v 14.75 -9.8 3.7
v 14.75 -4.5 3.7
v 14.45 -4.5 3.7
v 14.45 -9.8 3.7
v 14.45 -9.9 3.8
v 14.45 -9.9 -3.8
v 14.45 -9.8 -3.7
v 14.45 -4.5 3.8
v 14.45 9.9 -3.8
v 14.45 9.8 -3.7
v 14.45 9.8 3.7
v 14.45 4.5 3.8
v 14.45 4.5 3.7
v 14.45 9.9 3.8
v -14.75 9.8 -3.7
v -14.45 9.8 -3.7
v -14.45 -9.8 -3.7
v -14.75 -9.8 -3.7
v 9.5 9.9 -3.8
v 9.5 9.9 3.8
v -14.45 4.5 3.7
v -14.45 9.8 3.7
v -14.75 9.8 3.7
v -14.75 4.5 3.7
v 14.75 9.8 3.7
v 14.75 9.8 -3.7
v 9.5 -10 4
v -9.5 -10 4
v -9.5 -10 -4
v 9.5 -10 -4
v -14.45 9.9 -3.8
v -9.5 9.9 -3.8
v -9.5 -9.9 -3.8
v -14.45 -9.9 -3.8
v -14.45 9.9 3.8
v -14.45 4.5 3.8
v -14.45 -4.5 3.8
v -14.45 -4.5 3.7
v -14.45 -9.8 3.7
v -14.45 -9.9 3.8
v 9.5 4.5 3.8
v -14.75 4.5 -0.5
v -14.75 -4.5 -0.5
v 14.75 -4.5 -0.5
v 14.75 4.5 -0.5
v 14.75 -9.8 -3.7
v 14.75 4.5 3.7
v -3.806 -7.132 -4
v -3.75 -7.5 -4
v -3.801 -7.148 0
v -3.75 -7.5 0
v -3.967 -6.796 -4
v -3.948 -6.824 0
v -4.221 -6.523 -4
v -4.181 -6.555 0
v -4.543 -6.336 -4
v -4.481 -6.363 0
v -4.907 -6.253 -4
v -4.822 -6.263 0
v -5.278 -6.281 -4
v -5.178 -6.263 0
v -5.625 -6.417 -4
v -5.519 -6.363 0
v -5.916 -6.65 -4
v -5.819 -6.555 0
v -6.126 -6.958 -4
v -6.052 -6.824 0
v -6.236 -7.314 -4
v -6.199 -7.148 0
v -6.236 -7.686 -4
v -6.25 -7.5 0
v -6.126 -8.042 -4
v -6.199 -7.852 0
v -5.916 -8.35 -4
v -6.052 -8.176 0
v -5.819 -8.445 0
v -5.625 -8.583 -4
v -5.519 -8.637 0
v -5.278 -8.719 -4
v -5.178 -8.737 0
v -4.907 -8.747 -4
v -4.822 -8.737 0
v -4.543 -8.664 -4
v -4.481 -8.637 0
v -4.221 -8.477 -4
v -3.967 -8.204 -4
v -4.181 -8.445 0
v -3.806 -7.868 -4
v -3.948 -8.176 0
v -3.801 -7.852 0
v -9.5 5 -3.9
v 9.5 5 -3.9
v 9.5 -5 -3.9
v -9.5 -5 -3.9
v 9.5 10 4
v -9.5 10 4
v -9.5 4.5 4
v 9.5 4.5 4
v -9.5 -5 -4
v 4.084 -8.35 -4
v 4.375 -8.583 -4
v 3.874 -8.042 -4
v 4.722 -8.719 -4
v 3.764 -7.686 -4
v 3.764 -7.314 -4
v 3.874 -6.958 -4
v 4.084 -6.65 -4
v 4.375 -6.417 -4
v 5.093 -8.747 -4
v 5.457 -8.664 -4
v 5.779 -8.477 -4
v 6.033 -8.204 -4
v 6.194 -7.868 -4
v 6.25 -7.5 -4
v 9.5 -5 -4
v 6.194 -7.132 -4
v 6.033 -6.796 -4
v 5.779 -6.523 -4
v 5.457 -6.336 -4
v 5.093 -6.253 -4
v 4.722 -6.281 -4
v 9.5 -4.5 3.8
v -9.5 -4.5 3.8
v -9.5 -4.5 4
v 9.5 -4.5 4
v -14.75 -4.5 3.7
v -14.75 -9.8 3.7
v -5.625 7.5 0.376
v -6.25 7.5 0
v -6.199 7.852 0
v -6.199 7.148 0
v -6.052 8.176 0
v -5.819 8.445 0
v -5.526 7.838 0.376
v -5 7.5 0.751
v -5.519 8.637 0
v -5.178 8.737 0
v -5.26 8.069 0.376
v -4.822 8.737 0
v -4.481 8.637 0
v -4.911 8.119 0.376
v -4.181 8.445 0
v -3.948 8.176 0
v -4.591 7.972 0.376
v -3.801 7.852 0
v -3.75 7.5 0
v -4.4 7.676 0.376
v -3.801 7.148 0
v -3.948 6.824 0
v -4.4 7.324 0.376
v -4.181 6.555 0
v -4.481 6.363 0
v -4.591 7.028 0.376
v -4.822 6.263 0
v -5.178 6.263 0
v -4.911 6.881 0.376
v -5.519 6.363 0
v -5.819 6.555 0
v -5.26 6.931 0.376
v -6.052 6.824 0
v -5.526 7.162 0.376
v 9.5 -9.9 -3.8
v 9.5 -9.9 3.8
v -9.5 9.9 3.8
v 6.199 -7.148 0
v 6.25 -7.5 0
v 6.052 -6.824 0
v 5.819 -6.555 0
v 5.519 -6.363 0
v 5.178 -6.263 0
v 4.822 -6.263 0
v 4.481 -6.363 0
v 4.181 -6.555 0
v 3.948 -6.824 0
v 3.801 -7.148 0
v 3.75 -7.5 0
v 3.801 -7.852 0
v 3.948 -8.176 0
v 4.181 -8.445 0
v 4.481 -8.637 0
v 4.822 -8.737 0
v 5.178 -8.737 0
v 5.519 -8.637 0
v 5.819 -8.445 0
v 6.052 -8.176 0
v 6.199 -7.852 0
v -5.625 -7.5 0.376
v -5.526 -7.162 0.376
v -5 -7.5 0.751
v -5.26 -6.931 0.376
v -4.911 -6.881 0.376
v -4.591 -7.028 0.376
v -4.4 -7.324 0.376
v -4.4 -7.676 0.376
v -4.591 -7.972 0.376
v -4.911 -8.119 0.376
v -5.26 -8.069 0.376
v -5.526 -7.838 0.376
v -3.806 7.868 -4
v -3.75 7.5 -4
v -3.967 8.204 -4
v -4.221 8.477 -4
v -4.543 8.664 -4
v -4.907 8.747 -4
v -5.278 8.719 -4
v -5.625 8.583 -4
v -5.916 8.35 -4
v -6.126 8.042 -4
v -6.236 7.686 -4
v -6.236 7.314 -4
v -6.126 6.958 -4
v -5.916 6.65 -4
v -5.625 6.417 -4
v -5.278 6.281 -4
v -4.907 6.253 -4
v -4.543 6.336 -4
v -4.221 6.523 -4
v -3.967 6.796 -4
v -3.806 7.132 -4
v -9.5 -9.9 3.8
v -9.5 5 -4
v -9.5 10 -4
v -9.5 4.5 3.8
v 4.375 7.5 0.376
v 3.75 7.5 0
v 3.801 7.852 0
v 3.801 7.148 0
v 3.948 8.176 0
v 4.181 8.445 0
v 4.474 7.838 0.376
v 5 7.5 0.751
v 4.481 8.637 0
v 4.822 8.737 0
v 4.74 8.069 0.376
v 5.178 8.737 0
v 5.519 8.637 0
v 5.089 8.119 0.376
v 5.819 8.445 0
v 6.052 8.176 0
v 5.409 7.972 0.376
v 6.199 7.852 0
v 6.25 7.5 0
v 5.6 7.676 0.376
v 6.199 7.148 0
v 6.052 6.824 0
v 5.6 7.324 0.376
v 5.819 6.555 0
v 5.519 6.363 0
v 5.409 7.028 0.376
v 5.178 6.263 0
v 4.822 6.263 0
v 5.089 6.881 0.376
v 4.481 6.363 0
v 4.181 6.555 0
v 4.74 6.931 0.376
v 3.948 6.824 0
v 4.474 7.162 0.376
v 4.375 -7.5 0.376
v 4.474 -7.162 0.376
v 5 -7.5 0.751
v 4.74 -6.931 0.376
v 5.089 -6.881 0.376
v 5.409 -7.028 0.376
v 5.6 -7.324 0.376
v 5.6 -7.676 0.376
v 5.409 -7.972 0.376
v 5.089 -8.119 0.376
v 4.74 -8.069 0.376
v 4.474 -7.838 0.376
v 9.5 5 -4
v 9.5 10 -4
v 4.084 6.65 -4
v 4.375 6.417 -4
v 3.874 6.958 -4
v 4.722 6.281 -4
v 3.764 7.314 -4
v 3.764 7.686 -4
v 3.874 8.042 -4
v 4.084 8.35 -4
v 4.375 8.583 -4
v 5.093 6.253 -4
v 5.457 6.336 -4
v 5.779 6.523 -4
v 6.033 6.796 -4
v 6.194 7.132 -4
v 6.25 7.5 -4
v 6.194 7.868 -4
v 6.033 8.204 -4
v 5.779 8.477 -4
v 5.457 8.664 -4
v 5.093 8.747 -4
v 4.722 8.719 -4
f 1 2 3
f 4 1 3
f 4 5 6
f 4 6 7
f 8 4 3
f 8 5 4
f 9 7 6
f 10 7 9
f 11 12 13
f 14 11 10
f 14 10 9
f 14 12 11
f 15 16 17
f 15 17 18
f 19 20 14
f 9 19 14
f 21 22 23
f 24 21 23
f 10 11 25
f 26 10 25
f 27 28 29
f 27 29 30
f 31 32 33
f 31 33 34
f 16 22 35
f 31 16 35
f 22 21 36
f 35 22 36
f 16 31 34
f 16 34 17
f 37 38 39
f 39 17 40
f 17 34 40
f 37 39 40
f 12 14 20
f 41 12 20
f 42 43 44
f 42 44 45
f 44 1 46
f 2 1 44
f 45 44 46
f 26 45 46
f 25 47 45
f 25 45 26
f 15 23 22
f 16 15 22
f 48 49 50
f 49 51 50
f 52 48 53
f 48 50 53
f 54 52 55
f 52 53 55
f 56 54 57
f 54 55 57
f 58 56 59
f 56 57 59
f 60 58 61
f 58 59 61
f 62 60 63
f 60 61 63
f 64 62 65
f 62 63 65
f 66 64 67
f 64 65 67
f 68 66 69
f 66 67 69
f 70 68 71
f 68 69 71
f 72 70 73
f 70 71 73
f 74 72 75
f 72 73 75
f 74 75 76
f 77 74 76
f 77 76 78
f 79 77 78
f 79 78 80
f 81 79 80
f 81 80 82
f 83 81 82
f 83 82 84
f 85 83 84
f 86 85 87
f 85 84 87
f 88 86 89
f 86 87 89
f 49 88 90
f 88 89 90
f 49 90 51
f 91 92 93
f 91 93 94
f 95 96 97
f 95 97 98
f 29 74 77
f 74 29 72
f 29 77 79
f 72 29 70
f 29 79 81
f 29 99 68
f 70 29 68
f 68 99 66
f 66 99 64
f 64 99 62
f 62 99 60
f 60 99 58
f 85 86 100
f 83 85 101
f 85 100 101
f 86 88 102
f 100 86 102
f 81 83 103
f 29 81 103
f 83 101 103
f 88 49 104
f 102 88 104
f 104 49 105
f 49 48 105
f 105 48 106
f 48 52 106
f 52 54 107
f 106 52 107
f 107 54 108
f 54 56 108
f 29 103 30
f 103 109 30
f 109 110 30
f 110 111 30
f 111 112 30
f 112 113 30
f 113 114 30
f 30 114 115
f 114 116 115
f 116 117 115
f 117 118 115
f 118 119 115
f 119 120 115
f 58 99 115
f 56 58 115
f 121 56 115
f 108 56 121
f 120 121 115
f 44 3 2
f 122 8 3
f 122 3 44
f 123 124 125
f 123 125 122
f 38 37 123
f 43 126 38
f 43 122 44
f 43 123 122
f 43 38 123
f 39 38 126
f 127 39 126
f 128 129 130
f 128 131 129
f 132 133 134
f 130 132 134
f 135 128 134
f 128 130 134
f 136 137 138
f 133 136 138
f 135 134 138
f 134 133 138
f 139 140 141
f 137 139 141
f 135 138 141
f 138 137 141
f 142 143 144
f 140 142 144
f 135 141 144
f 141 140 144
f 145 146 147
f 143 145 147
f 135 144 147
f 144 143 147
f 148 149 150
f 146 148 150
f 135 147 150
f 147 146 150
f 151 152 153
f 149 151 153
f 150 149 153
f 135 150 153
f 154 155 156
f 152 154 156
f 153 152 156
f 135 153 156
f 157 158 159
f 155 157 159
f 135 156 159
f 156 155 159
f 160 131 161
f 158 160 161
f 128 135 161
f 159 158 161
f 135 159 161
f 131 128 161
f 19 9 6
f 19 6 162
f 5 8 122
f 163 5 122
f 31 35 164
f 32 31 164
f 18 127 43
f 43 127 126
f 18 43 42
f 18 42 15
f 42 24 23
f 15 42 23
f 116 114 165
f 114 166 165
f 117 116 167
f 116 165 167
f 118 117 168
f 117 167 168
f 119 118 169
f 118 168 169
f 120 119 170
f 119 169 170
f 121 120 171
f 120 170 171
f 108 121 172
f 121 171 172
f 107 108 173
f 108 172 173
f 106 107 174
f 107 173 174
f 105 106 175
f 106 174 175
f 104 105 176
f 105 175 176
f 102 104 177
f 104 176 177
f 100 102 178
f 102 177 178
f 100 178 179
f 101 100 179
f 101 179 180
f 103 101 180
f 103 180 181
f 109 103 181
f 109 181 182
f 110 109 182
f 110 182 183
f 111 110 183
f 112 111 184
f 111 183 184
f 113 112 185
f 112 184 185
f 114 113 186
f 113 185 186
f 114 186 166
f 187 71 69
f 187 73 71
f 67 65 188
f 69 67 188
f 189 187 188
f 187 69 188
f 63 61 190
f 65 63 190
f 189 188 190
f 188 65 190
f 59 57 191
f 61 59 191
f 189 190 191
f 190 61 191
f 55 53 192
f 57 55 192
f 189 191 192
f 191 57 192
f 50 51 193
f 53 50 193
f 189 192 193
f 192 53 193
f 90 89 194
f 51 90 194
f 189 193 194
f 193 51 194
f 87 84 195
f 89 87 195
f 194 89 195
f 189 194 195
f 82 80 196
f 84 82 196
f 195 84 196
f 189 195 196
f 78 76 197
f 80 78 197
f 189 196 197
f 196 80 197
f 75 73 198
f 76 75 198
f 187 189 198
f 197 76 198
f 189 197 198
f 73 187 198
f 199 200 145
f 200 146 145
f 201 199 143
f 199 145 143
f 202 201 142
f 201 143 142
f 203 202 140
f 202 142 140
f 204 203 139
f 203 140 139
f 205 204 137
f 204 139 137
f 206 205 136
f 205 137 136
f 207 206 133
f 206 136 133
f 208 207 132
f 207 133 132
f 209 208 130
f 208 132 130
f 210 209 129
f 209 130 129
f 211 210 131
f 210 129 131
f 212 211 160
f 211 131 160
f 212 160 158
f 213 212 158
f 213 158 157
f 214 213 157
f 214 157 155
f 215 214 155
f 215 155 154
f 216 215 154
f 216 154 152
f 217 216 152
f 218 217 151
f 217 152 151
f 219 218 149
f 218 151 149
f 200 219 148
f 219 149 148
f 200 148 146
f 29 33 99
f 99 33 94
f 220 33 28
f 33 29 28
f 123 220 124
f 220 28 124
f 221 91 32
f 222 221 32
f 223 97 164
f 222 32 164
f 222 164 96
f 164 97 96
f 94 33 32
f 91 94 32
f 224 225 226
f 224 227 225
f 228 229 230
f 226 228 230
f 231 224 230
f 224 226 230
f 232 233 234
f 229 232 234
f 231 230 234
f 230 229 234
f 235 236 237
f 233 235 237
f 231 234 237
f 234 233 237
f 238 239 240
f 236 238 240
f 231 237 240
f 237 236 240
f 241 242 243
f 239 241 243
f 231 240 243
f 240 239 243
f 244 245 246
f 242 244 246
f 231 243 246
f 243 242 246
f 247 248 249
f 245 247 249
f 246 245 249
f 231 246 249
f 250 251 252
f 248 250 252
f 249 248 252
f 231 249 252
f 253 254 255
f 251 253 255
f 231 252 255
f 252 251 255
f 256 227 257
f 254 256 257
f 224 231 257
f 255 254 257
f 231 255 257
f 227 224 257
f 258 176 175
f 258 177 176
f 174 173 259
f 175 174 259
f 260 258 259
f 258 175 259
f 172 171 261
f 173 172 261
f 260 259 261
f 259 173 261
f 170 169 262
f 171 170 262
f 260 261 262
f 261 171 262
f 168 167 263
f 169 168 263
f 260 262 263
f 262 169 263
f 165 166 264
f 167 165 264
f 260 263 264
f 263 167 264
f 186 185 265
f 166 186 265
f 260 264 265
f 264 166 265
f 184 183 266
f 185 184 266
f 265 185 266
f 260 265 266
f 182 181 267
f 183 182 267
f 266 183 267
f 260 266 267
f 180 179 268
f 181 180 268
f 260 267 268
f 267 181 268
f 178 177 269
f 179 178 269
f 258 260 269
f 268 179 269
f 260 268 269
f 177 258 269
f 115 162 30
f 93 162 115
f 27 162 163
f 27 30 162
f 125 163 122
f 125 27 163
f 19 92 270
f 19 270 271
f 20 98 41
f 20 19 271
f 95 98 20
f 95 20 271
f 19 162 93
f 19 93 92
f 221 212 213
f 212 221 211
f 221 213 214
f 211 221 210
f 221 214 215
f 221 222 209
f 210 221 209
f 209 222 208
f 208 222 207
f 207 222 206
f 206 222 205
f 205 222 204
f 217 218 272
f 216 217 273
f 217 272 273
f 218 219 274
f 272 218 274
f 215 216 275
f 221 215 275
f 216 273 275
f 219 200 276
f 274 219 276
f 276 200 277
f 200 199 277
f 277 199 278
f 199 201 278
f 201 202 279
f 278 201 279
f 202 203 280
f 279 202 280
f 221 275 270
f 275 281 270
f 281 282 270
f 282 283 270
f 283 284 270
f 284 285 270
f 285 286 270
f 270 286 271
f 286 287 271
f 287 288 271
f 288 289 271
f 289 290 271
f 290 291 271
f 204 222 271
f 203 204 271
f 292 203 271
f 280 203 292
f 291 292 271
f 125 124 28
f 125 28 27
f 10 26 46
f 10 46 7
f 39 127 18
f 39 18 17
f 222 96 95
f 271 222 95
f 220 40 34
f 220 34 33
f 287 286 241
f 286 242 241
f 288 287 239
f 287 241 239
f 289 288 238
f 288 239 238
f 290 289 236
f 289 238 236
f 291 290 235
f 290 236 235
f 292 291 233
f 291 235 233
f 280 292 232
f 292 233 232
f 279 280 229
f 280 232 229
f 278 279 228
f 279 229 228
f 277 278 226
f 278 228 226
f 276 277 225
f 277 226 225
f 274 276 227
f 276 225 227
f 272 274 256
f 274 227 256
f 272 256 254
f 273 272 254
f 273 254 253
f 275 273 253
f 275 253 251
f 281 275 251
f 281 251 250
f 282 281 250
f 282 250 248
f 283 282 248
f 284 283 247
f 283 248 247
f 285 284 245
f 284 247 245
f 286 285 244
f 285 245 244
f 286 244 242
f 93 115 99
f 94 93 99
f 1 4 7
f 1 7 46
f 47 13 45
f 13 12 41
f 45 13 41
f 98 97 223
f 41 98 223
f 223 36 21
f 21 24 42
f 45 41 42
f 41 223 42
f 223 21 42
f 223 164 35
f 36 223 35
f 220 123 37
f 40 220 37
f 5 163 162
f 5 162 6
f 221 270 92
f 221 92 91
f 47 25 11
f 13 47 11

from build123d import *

# Parameters (mm, degrees)
ESQUISSE1_W                                   = 29.5
ESQUISSE1_H                                   = 20
BOSS_EXTRU_1_DEPTH                            = 4
ENL_V_MAT_EXTRU_1_DEPTH                       = 32.404617495
ENL_V_MAT_EXTRU_1_DEPTH_BACK                  = 32.404617495
ESQUISSE2_W                                   = 4.5
ESQUISSE2_H                                   = 9
ESQUISSE3_W                                   = 19
ESQUISSE3_H                                   = 10
ENL_V_MAT_EXTRU_2_DEPTH                       = 0.1
ESQUISSE4_W                                   = 5.25
ESQUISSE4_H                                   = 20
ENL_V_MAT_EXTRU_3_DEPTH                       = 0.2
ESQUISSE5_W                                   = 0.3
ESQUISSE5_H                                   = 20
ENL_V_MAT_EXTRU_4_DEPTH                       = 0.1
ESQUISSE6_W                                   = 5.25
ESQUISSE6_H                                   = 7.8
ENL_V_MAT_EXTRU_5_DEPTH                       = 0.1
ESQUISSE7_W                                   = 0.3
ESQUISSE7_H                                   = 7.8
ENL_V_MAT_EXTRU_6_DEPTH                       = 0.1
TROU_POUR_TARAUDAGE_POUR_TROU_TARAUD_M3_D     = 2.5
TROU_POUR_TARAUDAGE_POUR_TROU_TARAUD_M3_DEPTH = 4
TROU_POUR_TARAUDAGE_POUR_TROU_TARAUD_M3_TIP   = 0.751075774


with BuildPart() as part:
    # Esquisse1 → Boss.-Extru.1 (new, symmetric)
    with BuildSketch(Plane.XY):
        Rectangle(ESQUISSE1_W, ESQUISSE1_H)
    extrude(amount=BOSS_EXTRU_1_DEPTH, both=True)

    # Esquisse2 → Enlèv. mat.-Extru.1 (cut, two sides: drawn at the far end of the back side and taken through both)
    with BuildSketch(Plane(origin=(14.75, 0, 0), x_dir=(0, 0, -1), z_dir=(1, 0, 0)).offset(-ENL_V_MAT_EXTRU_1_DEPTH_BACK)):
        with Locations((-1.75, 0)):
            Rectangle(ESQUISSE2_W, ESQUISSE2_H)
    extrude(amount=ENL_V_MAT_EXTRU_1_DEPTH + ENL_V_MAT_EXTRU_1_DEPTH_BACK, mode=Mode.SUBTRACT)

    # Esquisse3 → Enlèv. mat.-Extru.2 (cut)
    with BuildSketch(Plane(origin=(0, 0, -4), x_dir=(-1, 0, 0), z_dir=(0, 0, -1))):
        Rectangle(ESQUISSE3_W, ESQUISSE3_H)
    extrude(amount=-ENL_V_MAT_EXTRU_2_DEPTH, mode=Mode.SUBTRACT)

    # Esquisse4 → Enlèv. mat.-Extru.3 (cut)
    with BuildSketch(Plane(origin=(0, 0, -4), x_dir=(-1, 0, 0), z_dir=(0, 0, -1))):
        with Locations((-12.125, 0)):
            Rectangle(ESQUISSE4_W, ESQUISSE4_H)
        with Locations((12.125, 0)):
            Rectangle(ESQUISSE4_W, ESQUISSE4_H)
    enl_v_mat_extru_3 = extrude(amount=-ENL_V_MAT_EXTRU_3_DEPTH, mode=Mode.SUBTRACT)

    # Esquisse5 → Enlèv. mat.-Extru.4 (cut)
    with BuildSketch(Plane(origin=(0, 0, -3.8), x_dir=(-1, 0, 0), z_dir=(0, 0, -1))):
        with Locations((-14.6, 0)):
            Rectangle(ESQUISSE5_W, ESQUISSE5_H)
        with Locations((14.6, 0)):
            Rectangle(ESQUISSE5_W, ESQUISSE5_H)
    enl_v_mat_extru_4 = extrude(amount=-ENL_V_MAT_EXTRU_4_DEPTH, mode=Mode.SUBTRACT)

    # Esquisse6 → Enlèv. mat.-Extru.5 (cut)
    with BuildSketch(Plane.XZ.offset(10)):
        with Locations((12.125, 0.1)):
            Rectangle(ESQUISSE6_W, ESQUISSE6_H)
        with Locations((-12.125, 0.1)):
            Rectangle(ESQUISSE6_W, ESQUISSE6_H)
    enl_v_mat_extru_5 = extrude(amount=-ENL_V_MAT_EXTRU_5_DEPTH, mode=Mode.SUBTRACT)

    # Esquisse7 → Enlèv. mat.-Extru.6 (cut)
    with BuildSketch(Plane.XZ.offset(9.9)):
        with Locations((-14.6, 0.1)):
            Rectangle(ESQUISSE7_W, ESQUISSE7_H)
        with Locations((14.6, 0.1)):
            Rectangle(ESQUISSE7_W, ESQUISSE7_H)
    enl_v_mat_extru_6 = extrude(amount=-ENL_V_MAT_EXTRU_6_DEPTH, mode=Mode.SUBTRACT)

    # Symétrie2: Enlèv. mat.-Extru.3, Enlèv. mat.-Extru.4 across plane
    add(enl_v_mat_extru_3.mirror(Plane.XY), mode=Mode.SUBTRACT)
    add(enl_v_mat_extru_4.mirror(Plane.XY), mode=Mode.SUBTRACT)

    # Symétrie2 at the second plane: Enlèv. mat.-Extru.3, Enlèv. mat.-Extru.4 across plane
    add(enl_v_mat_extru_3.mirror(Plane.ZX), mode=Mode.SUBTRACT)
    add(enl_v_mat_extru_4.mirror(Plane.ZX), mode=Mode.SUBTRACT)

    # Symétrie3: Enlèv. mat.-Extru.5, Enlèv. mat.-Extru.6 across plane
    add(enl_v_mat_extru_5.mirror(Plane.ZX), mode=Mode.SUBTRACT)
    add(enl_v_mat_extru_6.mirror(Plane.ZX), mode=Mode.SUBTRACT)

    # Trou pour taraudage pour trou taraudé M31
    with Locations(Plane(origin=(0, 0, -4), x_dir=(-1, 0, 0), z_dir=(0, 0, -1))):
        with Locations((-5, 7.5), (5, 7.5), (-5, -7.5), (5, -7.5)):
            Hole(TROU_POUR_TARAUDAGE_POUR_TROU_TARAUD_M3_D / 2, depth=TROU_POUR_TARAUDAGE_POUR_TROU_TARAUD_M3_DEPTH)
            with Locations((0, 0, -(TROU_POUR_TARAUDAGE_POUR_TROU_TARAUD_M3_DEPTH + TROU_POUR_TARAUDAGE_POUR_TROU_TARAUD_M3_TIP / 2))):  # 118° drill point
                Cone(0, TROU_POUR_TARAUDAGE_POUR_TROU_TARAUD_M3_D / 2, TROU_POUR_TARAUDAGE_POUR_TROU_TARAUD_M3_TIP, mode=Mode.SUBTRACT)


solid = part.part
